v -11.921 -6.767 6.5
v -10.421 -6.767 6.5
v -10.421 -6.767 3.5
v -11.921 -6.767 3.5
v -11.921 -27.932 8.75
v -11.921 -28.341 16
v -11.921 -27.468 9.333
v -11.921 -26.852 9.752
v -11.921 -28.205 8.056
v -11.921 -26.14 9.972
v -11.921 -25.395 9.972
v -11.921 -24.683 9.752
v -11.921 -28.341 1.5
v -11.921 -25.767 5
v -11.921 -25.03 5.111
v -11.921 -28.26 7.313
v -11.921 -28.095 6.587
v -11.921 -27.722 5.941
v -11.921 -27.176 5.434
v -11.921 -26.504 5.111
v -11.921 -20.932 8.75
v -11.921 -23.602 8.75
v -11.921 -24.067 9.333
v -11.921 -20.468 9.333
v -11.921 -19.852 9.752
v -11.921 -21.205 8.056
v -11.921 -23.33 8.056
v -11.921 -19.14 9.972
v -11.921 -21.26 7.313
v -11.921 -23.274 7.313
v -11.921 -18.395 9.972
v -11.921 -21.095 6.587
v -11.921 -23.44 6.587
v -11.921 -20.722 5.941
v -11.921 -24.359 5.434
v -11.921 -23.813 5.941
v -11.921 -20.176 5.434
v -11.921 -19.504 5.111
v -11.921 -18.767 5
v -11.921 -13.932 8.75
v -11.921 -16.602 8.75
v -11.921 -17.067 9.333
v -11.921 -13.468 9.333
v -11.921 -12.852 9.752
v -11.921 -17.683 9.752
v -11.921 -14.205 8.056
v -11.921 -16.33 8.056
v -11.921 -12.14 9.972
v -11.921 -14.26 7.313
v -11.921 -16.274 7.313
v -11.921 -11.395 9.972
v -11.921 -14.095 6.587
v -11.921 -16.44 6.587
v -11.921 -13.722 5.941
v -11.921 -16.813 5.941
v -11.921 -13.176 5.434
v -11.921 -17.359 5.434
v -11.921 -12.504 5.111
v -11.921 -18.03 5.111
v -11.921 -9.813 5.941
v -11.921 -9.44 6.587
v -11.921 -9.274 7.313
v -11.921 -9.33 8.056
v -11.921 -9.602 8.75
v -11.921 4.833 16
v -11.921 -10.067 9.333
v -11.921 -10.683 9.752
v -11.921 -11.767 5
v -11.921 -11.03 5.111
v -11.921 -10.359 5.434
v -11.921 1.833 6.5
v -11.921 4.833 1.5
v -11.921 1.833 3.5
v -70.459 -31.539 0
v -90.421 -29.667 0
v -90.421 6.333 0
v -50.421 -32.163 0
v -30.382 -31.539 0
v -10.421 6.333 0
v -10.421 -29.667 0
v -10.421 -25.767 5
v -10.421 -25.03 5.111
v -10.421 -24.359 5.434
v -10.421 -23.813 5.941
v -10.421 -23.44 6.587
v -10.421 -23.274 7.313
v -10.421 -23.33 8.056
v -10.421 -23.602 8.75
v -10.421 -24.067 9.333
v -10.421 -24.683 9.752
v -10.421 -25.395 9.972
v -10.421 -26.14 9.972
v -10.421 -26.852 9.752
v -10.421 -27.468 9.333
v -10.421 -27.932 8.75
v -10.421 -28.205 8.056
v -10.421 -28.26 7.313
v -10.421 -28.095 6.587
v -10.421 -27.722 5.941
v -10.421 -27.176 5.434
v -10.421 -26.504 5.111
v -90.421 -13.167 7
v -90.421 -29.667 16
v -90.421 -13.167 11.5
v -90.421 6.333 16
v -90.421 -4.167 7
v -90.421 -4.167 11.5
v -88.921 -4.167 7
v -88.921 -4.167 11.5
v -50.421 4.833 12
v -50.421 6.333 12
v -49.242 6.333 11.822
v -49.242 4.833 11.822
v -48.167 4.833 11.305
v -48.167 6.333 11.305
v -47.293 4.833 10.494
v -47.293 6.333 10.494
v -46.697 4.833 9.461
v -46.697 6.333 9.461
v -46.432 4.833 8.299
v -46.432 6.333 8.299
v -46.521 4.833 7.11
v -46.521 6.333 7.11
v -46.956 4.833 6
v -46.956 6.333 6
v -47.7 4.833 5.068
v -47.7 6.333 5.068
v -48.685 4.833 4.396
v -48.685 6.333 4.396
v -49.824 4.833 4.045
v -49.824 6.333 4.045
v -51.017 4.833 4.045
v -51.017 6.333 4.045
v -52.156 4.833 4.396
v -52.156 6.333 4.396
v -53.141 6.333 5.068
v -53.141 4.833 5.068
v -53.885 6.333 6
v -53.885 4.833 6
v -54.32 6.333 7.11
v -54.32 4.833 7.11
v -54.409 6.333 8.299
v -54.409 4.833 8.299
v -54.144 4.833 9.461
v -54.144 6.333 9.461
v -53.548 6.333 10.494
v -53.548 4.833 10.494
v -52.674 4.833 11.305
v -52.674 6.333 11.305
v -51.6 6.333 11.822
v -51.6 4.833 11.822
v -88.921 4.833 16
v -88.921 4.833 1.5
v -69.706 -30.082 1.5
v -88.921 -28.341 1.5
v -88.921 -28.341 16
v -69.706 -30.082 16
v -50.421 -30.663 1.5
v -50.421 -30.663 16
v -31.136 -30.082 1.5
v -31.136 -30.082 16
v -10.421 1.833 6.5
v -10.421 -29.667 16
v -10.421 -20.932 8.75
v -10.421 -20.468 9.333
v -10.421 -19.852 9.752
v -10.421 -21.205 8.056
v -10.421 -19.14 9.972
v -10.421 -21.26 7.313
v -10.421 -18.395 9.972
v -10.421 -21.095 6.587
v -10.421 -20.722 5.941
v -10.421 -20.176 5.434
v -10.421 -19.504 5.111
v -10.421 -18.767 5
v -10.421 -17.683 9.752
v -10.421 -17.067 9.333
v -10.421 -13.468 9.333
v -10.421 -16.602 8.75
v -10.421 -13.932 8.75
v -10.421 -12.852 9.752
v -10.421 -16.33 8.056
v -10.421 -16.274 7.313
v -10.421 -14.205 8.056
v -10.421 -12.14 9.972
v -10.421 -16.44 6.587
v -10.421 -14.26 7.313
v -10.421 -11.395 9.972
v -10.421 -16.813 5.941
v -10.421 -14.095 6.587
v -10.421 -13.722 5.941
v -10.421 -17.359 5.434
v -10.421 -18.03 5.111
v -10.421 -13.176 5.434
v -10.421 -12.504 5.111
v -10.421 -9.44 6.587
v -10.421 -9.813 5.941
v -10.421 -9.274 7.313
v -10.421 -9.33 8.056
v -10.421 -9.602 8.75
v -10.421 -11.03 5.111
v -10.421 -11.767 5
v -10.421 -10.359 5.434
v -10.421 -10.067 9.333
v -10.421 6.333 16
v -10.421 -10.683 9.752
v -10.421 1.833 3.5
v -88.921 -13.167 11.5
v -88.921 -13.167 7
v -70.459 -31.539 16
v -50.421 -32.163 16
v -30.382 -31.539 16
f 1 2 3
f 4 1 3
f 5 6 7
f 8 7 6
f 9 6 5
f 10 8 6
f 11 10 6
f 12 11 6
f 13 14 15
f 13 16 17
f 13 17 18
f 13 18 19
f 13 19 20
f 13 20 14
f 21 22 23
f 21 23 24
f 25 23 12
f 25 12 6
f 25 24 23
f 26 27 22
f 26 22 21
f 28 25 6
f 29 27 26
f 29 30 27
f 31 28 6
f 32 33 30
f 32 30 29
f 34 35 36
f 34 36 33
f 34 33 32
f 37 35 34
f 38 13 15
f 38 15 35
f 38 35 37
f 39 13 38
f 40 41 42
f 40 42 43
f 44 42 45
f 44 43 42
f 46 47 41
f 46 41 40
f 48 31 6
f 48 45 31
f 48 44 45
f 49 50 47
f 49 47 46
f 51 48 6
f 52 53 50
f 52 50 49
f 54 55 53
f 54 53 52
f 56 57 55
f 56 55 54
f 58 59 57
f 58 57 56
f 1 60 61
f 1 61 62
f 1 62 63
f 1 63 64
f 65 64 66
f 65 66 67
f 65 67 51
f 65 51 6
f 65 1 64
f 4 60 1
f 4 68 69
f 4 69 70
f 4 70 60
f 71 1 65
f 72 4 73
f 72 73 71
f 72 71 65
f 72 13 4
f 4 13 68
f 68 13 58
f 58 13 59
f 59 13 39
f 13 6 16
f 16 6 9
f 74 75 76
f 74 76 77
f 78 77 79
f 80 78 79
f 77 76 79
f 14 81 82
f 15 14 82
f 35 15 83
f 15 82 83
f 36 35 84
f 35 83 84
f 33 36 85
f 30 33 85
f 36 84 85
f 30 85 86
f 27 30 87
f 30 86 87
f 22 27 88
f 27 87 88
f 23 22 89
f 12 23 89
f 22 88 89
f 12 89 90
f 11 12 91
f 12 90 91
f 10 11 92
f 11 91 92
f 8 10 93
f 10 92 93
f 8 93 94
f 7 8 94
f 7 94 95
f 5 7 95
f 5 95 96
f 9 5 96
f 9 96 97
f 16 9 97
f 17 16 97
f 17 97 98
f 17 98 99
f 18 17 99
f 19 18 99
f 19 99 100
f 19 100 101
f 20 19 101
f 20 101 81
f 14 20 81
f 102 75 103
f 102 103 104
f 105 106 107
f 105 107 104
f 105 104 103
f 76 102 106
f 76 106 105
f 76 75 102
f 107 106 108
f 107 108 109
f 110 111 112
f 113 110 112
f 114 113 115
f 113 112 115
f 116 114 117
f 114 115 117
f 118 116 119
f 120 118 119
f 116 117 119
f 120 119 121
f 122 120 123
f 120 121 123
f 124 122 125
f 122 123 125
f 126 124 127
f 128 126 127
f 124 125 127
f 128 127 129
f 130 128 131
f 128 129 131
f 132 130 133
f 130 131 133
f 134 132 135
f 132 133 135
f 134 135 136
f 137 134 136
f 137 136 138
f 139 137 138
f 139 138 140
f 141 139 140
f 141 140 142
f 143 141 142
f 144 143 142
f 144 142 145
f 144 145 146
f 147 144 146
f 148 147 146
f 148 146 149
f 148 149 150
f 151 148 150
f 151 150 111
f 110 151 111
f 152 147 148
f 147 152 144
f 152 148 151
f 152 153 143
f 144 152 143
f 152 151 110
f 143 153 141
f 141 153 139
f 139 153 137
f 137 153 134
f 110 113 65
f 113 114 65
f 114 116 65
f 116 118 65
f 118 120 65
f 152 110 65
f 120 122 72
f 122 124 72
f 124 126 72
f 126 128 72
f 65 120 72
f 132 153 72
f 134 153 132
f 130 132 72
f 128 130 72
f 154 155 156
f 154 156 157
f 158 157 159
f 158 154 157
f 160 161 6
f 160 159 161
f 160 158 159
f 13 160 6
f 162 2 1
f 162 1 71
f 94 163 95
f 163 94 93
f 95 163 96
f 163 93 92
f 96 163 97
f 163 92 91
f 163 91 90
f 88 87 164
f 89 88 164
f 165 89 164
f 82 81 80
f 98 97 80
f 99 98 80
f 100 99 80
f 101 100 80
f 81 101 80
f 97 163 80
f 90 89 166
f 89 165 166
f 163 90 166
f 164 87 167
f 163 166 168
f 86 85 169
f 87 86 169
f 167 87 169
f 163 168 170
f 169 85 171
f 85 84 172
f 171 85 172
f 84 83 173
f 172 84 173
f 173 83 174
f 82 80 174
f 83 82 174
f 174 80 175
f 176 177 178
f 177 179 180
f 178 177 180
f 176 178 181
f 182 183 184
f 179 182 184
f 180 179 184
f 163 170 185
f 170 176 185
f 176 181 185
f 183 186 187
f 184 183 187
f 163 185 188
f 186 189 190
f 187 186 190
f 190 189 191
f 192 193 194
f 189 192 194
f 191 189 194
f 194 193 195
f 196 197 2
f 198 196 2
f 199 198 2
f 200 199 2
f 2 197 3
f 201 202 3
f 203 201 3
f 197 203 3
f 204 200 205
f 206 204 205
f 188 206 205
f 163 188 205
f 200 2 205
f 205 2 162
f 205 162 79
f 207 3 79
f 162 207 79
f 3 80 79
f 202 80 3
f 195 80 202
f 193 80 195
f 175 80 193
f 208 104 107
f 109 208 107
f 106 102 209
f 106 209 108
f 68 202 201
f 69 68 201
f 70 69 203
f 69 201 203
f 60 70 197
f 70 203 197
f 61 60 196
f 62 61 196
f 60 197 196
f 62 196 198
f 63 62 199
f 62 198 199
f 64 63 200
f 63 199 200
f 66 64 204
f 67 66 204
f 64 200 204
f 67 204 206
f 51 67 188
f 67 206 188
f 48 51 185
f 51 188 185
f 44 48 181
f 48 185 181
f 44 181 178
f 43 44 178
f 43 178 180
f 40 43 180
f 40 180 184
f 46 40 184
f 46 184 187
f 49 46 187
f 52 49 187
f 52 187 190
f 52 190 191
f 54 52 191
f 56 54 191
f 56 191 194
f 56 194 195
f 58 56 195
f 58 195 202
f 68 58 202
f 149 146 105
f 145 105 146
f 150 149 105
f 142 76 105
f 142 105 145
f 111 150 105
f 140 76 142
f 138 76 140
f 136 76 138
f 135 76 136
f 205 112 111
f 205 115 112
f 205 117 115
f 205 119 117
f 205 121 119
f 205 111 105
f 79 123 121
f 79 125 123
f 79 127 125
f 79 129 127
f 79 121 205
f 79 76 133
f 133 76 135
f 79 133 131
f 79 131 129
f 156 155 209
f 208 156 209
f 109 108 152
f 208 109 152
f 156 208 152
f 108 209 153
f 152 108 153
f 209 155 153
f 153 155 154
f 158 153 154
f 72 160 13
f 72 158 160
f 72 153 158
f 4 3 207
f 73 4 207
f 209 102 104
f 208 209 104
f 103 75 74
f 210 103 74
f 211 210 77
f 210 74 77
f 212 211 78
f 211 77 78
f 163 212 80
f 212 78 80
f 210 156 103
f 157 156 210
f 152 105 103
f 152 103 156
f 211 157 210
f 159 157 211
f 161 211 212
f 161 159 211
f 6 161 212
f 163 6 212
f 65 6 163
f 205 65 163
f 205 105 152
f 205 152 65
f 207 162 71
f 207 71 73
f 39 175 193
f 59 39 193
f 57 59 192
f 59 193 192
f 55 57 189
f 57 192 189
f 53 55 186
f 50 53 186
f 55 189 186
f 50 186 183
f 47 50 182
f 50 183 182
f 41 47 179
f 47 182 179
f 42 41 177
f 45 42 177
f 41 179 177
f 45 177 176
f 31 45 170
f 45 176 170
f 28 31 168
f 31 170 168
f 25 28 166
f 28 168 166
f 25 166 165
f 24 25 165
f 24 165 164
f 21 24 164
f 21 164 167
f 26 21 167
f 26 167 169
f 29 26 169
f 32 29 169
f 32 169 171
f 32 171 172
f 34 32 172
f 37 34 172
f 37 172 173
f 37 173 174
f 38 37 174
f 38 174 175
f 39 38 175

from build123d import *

# Parameters (mm, degrees)
SKETCH_1_W          = 80
SKETCH_1_H          = 36
EXTRUDE_1_DEPTH     = 16
SHELL_1_T           = -1.5
CUT_EXTRUDE_3_REACH = 89.695
SKETCH_2_W          = 4.5
SKETCH_2_H          = 9
CUT_EXTRUDE_4_REACH = 89.695
SKETCH_6_R          = 2.5
SKETCH_6_W          = 3
SKETCH_6_H          = 8.6
SKETCH_7_R          = 4
CUT_EXTRUDE_5_DEPTH = 2


with BuildPart() as part:
    # 草图1 → 凸台-拉伸1 (new body)
    with BuildSketch(Plane.XY):
        with Locations((-50.420566467, -11.667328482)):
            Rectangle(SKETCH_1_W, SKETCH_1_H)
        with BuildLine():
            Line((-10.420566467, -29.667328482), (-90.420566467, -29.667328482))
            ThreePointArc((-90.420566467, -29.667328482), (-50.420566467, -32.163413079), (-10.420566467, -29.667328482))
        make_face()
    extrude(amount=EXTRUDE_1_DEPTH)

    # 抽壳1
    shell_1_openings = [part.faces().sort_by_distance(p)[0] for p in [
        (-50.420566467, -12.507347913, 16),
    ]]
    offset(amount=SHELL_1_T, openings=shell_1_openings, kind=Kind.INTERSECTION)

    # 草图2 → 切除-拉伸3 (cut, up to next)
    with BuildSketch(Plane.ZY.offset(90.420566467), mode=Mode.PRIVATE) as cut_extrude_3_sk1:
        with Locations((9.25, -8.667328482)):
            Rectangle(SKETCH_2_W, SKETCH_2_H)
    cut_extrude_3_tool1 = extrude(cut_extrude_3_sk1.sketch, amount=-CUT_EXTRUDE_3_REACH, mode=Mode.PRIVATE) & part.part
    add(cut_extrude_3_tool1.solids().sort_by_distance((-90.420566, -8.667328, 9.25))[0], mode=Mode.SUBTRACT)

    # 草图6 → 切除-拉伸4 (cut, up to next)
    with BuildSketch(Plane(origin=(-10.420566467, 0, 0), x_dir=(0, 0, -1), z_dir=(1, 0, 0)), mode=Mode.PRIVATE) as cut_extrude_4_sk1:
        with Locations((-7.5, -11.767328482)):
            Circle(SKETCH_6_R)
    cut_extrude_4_tool1 = extrude(cut_extrude_4_sk1.sketch, amount=-CUT_EXTRUDE_4_REACH, mode=Mode.PRIVATE) & part.part
    # 草图6 → 切除-拉伸4 (cut, up to next)
    with BuildSketch(Plane(origin=(-10.420566467, 0, 0), x_dir=(0, 0, -1), z_dir=(1, 0, 0)), mode=Mode.PRIVATE) as cut_extrude_4_sk2:
        with Locations((-7.5, -18.767328482)):
            Circle(SKETCH_6_R)
    cut_extrude_4_tool2 = extrude(cut_extrude_4_sk2.sketch, amount=-CUT_EXTRUDE_4_REACH, mode=Mode.PRIVATE) & part.part
    # 草图6 → 切除-拉伸4 (cut, up to next)
    with BuildSketch(Plane(origin=(-10.420566467, 0, 0), x_dir=(0, 0, -1), z_dir=(1, 0, 0)), mode=Mode.PRIVATE) as cut_extrude_4_sk3:
        with Locations((-7.5, -25.767328482)):
            Circle(SKETCH_6_R)
    cut_extrude_4_tool3 = extrude(cut_extrude_4_sk3.sketch, amount=-CUT_EXTRUDE_4_REACH, mode=Mode.PRIVATE) & part.part
    # 草图6 → 切除-拉伸4 (cut, up to next)
    with BuildSketch(Plane(origin=(-10.420566467, 0, 0), x_dir=(0, 0, -1), z_dir=(1, 0, 0)), mode=Mode.PRIVATE) as cut_extrude_4_sk4:
        with Locations((-5, -2.467328482)):
            Rectangle(SKETCH_6_W, SKETCH_6_H)
    cut_extrude_4_tool4 = extrude(cut_extrude_4_sk4.sketch, amount=-CUT_EXTRUDE_4_REACH, mode=Mode.PRIVATE) & part.part
    add(cut_extrude_4_tool1.solids().sort_by_distance((-10.420566, -11.767328, 7.5))[0], mode=Mode.SUBTRACT)
    add(cut_extrude_4_tool2.solids().sort_by_distance((-10.420566, -18.767328, 7.5))[0], mode=Mode.SUBTRACT)
    add(cut_extrude_4_tool3.solids().sort_by_distance((-10.420566, -25.767328, 7.5))[0], mode=Mode.SUBTRACT)
    add(cut_extrude_4_tool4.solids().sort_by_distance((-10.420566, -2.467328, 5))[0], mode=Mode.SUBTRACT)

    # 草图7 → 切除-拉伸5 (cut)
    with BuildSketch(Plane(origin=(0, 6.332671518, 0), x_dir=(1, 0, 0), z_dir=(0, 1, 0))):
        with Locations(Location((-50.420566467, -8, 0), (0, 0, 270))):
            Circle(SKETCH_7_R)
    extrude(amount=-CUT_EXTRUDE_5_DEPTH, mode=Mode.SUBTRACT)


solid = part.part
